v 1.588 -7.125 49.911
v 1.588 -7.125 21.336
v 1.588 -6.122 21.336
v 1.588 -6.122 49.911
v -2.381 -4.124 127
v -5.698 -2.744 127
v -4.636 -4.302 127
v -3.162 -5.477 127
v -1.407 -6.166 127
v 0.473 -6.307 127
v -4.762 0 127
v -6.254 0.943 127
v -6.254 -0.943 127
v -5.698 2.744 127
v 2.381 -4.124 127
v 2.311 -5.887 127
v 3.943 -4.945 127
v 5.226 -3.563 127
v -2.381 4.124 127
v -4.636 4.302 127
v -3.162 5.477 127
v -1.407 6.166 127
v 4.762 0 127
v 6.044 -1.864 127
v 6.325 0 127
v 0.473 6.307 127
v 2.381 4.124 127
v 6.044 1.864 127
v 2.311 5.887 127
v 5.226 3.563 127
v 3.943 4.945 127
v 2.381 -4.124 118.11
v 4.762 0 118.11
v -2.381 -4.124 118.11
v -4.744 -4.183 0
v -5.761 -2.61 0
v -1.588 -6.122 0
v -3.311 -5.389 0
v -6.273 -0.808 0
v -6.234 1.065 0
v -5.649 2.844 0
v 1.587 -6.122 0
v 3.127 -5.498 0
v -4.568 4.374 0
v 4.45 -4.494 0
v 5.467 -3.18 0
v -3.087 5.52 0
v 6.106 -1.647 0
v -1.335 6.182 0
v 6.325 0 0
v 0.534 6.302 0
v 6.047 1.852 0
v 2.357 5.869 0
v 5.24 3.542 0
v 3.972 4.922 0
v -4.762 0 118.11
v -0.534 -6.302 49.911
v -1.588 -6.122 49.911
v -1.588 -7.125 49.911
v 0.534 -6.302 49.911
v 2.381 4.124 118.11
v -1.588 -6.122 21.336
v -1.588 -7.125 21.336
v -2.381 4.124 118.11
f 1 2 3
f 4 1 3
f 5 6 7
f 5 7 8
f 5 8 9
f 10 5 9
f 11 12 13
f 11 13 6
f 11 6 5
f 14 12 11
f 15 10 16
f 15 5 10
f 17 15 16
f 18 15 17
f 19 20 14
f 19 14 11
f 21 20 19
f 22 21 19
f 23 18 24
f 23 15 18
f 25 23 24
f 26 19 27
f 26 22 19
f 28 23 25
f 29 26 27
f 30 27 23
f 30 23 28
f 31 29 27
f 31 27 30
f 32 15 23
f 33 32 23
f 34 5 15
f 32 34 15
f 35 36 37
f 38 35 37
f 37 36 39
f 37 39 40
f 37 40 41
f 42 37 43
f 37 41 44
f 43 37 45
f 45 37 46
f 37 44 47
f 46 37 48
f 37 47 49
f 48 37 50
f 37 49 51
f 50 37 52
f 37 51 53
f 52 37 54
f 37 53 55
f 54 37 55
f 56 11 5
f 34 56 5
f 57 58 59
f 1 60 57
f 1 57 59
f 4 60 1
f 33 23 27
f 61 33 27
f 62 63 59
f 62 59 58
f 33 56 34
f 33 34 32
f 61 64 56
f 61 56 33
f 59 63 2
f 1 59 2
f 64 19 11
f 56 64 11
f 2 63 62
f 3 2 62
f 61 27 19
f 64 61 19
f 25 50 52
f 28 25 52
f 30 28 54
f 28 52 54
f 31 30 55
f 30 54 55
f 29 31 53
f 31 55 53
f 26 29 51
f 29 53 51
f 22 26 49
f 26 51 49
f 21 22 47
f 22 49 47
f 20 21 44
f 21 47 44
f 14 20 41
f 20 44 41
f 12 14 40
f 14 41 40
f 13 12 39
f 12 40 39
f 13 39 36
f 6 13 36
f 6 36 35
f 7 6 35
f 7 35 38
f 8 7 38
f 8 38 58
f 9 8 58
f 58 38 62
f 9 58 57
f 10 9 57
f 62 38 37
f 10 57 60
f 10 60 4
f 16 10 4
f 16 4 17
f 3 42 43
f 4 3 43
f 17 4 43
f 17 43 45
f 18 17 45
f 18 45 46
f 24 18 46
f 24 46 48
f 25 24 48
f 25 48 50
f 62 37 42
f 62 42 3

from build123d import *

# Parameters (mm, degrees)
SKETCH8_R           = 6.3246
BOSS_EXTRUDE7_DEPTH = 127
SKETCH9_W           = 3.175
SKETCH9_H           = 1.6002
BOSS_EXTRUDE8_DEPTH = 49.911
SKETCH10_W          = 21.336
SKETCH10_H          = 1.002575458
CUT_EXTRUDE1_DEPTH  = 3.937
CUT_EXTRUDE2_DEPTH  = 8.89


with BuildPart() as part:
    # Sketch8 → Boss-Extrude7 (new body)
    with BuildSketch(Plane.XY):
        Circle(SKETCH8_R)
    extrude(amount=BOSS_EXTRUDE7_DEPTH)

    # Sketch9 → Boss-Extrude8 (add)
    with BuildSketch(Plane.XY):
        with Locations((0, -6.3246)):
            Rectangle(SKETCH9_W, SKETCH9_H)
    extrude(amount=BOSS_EXTRUDE8_DEPTH)

    # Sketch10 → Cut-Extrude1 (cut)
    with BuildSketch(Plane.ZY.offset(1.5875)):
        with Locations((10.668, -6.623412271)):
            Rectangle(SKETCH10_W, SKETCH10_H)
    extrude(amount=-CUT_EXTRUDE1_DEPTH, mode=Mode.SUBTRACT)

    # Sketch11 → Cut-Extrude2 (cut)
    with BuildSketch(Plane.XY.offset(127)):
        Polygon((4.7625, 0), (2.38125, 4.124445986), (-2.38125, 4.124445986), (-4.7625, 0), (-2.38125, -4.124445986), (2.38125, -4.124445986), align=None)
    extrude(amount=-CUT_EXTRUDE2_DEPTH, mode=Mode.SUBTRACT)


solid = part.part
